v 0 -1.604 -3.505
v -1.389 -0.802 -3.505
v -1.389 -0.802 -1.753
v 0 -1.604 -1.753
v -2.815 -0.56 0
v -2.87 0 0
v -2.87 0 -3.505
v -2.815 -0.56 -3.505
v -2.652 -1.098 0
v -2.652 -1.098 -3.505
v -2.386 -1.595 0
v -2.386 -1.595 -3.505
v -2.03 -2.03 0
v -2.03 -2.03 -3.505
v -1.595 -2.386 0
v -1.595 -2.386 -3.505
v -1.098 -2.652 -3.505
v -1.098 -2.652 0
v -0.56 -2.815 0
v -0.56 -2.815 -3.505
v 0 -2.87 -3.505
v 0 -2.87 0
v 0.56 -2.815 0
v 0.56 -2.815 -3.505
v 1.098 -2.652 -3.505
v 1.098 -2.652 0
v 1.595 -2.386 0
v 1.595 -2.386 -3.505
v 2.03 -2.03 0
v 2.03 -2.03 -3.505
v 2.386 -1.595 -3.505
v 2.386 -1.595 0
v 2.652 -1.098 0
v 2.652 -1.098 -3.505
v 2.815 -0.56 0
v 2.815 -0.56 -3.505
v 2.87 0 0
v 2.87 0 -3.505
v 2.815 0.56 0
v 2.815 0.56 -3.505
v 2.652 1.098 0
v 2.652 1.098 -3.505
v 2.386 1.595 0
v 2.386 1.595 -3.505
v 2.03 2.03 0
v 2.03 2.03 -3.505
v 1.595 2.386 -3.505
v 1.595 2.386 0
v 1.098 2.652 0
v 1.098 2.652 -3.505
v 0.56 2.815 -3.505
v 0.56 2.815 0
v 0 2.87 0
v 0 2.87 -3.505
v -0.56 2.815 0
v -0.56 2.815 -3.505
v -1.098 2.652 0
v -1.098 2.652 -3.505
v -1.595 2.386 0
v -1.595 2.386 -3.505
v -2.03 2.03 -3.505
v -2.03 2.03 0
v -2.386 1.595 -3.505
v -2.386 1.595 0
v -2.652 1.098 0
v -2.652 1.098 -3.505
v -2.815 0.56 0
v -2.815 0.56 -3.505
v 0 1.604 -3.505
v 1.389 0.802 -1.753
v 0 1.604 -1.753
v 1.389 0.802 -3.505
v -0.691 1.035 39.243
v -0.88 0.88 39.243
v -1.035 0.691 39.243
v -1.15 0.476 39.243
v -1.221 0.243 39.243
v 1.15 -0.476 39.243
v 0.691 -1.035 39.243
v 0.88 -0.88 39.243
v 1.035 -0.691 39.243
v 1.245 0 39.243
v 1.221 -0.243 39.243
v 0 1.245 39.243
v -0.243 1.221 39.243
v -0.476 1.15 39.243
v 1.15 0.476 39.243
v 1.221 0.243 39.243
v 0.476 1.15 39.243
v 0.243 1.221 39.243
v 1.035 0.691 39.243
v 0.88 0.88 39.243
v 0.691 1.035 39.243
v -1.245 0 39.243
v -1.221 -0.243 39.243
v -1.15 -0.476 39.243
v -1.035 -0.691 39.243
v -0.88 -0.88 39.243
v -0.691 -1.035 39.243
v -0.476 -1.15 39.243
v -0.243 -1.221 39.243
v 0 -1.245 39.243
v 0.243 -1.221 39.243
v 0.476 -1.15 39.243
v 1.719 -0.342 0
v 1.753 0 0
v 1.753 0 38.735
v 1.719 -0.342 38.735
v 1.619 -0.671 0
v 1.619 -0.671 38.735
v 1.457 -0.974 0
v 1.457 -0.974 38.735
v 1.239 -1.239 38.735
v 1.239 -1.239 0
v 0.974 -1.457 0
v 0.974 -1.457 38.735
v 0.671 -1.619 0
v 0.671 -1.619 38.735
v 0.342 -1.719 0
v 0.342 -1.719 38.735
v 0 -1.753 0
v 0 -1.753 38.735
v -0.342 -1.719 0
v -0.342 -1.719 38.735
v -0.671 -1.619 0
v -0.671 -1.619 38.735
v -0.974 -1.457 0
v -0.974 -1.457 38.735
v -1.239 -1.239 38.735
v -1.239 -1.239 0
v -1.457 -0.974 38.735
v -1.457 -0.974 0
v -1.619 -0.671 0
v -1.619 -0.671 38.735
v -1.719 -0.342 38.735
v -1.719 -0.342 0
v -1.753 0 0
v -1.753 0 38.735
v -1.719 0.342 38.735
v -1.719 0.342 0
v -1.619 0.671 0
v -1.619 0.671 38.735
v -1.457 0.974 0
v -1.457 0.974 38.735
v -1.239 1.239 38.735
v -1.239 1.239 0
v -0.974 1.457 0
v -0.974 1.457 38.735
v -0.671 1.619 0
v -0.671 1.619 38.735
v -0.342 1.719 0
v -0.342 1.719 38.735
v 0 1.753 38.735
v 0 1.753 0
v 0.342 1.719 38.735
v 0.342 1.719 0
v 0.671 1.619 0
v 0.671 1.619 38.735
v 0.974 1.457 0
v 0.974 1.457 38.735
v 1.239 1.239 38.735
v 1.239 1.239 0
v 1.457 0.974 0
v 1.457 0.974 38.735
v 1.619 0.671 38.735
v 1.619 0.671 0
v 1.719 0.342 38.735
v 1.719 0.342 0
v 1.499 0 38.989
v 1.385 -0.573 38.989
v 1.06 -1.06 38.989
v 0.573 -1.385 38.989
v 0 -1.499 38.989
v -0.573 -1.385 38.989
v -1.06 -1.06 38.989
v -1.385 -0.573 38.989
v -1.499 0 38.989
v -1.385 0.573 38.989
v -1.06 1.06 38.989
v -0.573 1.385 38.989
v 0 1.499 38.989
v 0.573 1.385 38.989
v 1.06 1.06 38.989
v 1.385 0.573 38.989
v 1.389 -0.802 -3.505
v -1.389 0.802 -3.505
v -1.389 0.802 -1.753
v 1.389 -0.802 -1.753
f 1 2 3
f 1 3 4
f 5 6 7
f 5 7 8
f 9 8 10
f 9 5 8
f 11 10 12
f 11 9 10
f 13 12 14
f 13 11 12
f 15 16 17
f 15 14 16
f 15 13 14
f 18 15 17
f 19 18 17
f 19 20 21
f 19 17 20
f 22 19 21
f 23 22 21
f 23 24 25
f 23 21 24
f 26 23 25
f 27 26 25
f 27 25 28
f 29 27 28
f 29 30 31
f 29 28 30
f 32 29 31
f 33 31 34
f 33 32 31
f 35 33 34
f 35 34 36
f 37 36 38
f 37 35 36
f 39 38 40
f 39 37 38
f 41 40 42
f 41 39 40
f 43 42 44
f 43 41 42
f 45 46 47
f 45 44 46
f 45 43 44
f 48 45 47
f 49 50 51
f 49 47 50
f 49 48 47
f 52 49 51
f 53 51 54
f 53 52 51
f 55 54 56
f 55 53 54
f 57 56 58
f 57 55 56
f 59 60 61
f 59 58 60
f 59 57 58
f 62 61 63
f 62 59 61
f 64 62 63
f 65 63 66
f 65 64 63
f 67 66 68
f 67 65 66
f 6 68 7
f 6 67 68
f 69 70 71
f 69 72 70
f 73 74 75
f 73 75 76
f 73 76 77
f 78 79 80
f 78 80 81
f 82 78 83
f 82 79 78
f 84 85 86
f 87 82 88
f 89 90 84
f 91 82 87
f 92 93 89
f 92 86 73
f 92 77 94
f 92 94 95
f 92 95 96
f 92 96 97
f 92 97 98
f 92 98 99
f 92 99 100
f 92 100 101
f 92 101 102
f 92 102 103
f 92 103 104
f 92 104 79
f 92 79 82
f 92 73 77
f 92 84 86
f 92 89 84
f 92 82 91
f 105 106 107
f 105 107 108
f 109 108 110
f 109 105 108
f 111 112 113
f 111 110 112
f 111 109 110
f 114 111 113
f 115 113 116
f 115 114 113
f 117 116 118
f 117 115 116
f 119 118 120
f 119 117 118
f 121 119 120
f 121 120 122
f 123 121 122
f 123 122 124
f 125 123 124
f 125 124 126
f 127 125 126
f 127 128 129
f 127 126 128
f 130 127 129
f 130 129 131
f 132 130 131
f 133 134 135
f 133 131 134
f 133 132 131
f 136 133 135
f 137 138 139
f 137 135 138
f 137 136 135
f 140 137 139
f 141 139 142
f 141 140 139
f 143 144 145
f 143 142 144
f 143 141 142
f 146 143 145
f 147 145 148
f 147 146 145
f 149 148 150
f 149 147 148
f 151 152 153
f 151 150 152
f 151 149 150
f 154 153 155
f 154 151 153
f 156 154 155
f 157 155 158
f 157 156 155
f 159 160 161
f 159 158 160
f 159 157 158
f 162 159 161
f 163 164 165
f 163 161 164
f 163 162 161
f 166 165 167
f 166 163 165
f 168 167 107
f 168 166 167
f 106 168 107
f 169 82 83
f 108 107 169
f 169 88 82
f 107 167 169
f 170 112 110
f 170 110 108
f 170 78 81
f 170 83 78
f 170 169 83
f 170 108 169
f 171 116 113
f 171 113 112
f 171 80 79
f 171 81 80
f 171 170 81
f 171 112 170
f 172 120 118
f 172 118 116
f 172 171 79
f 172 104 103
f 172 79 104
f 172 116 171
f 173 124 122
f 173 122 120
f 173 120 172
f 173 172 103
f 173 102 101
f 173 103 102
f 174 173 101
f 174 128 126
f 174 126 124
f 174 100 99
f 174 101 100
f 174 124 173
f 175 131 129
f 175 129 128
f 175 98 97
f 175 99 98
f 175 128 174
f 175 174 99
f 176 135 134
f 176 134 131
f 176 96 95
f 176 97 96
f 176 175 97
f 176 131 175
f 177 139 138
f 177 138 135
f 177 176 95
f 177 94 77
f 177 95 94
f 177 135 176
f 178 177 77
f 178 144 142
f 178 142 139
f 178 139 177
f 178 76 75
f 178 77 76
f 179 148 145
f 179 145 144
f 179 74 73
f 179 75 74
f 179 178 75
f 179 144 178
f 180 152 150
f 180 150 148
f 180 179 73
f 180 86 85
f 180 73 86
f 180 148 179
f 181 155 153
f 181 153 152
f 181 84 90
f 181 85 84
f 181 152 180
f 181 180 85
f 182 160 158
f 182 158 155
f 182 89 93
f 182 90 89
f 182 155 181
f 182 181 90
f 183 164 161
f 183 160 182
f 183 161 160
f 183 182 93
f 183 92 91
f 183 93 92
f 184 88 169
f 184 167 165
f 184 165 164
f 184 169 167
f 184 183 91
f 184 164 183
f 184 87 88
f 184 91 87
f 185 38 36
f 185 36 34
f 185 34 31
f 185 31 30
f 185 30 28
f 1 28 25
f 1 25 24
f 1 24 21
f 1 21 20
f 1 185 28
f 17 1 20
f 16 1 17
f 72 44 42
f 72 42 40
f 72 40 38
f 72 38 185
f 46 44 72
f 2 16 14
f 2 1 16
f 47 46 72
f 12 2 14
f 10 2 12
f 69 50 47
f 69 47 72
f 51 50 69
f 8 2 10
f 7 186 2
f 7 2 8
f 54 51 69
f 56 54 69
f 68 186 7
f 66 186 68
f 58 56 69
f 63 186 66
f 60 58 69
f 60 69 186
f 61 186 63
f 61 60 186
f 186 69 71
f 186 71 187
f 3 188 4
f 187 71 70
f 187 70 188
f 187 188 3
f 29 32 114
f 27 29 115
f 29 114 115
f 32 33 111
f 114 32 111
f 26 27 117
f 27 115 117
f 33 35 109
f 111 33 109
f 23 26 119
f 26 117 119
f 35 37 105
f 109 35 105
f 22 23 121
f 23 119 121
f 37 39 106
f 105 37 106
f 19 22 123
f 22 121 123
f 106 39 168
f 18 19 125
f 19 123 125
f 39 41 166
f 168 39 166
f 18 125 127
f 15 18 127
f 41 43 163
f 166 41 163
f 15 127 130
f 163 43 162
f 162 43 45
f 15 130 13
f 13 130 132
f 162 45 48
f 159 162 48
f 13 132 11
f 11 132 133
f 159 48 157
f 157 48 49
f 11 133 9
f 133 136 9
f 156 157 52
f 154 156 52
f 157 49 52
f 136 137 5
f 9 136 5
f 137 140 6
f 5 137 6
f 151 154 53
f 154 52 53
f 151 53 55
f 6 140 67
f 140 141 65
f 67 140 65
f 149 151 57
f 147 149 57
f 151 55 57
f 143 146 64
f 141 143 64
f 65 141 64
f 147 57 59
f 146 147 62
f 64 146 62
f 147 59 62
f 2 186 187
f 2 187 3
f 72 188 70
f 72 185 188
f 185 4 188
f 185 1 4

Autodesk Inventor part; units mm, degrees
ref_plane "YZ Plane" through (0, 0, 0) normal (1, 0, 0) x (0, 1, 0)
ref_plane "XZ Plane" through (0, 0, 0) normal (0, 1, 0) x (-1, 0, 0)
ref_plane "XY Plane" through (0, 0, 0) normal (0, 0, 1) x (1, 0, 0)
sketch "Sketch1" plane through (0, 0, 0) normal (0, 0, 1) x (1, 0, 0)
  circle A0 centre (0, 0) radius 1.7526
  dimension "d0" = 3.5052
extrude "Extrusion1" add sketch "Sketch1" along normal blind 39.243
sketch "Sketch2" plane through (0, 0, 0) normal (0, 0, -1) x (-1, 0, 0)
  circle A0 centre (0, 0) radius 1.7526 construction
  circle A1 centre (0, 0) radius 2.8702
  dimension "d3" = 5.7404
extrude "Extrusion2" add sketch "Sketch2" along normal blind 3.5052
sketch "Sketch3" plane through (0, 0, -3.5052) normal (0, 0, -1) x (-1, 0, 0)
  circle A0 centre (0, 0) radius 2.8702 projected
  line L0 (0, 1.604) -> (1.3891, 0.802)
  line L1 (1.3891, 0.802) -> (1.3891, -0.802)
  line L2 (1.3891, -0.802) -> (0, -1.604)
  line L3 (0, -1.604) -> (-1.3891, -0.802)
  line L4 (-1.3891, -0.802) -> (-1.3891, 0.802)
  line L5 (-1.3891, 0.802) -> (0, 1.604)
  dimension "d6" = 2.7781
extrude "Extrusion3" cut sketch "Sketch3" against normal blind 1.7526 contours L0 L1 L2 L3 L4 L5
chamfer "Chamfer1" distance 0.508 angle 45 1 edges at (-1.7526, 0, 39.243)
thread "Thread2" size "6-32 UNC" class "2A" standard "ANSI Unified Screw Threads" length 25.4
properties part number "6-32 SHCS x1750 - .205" material "Stainless Steel"
